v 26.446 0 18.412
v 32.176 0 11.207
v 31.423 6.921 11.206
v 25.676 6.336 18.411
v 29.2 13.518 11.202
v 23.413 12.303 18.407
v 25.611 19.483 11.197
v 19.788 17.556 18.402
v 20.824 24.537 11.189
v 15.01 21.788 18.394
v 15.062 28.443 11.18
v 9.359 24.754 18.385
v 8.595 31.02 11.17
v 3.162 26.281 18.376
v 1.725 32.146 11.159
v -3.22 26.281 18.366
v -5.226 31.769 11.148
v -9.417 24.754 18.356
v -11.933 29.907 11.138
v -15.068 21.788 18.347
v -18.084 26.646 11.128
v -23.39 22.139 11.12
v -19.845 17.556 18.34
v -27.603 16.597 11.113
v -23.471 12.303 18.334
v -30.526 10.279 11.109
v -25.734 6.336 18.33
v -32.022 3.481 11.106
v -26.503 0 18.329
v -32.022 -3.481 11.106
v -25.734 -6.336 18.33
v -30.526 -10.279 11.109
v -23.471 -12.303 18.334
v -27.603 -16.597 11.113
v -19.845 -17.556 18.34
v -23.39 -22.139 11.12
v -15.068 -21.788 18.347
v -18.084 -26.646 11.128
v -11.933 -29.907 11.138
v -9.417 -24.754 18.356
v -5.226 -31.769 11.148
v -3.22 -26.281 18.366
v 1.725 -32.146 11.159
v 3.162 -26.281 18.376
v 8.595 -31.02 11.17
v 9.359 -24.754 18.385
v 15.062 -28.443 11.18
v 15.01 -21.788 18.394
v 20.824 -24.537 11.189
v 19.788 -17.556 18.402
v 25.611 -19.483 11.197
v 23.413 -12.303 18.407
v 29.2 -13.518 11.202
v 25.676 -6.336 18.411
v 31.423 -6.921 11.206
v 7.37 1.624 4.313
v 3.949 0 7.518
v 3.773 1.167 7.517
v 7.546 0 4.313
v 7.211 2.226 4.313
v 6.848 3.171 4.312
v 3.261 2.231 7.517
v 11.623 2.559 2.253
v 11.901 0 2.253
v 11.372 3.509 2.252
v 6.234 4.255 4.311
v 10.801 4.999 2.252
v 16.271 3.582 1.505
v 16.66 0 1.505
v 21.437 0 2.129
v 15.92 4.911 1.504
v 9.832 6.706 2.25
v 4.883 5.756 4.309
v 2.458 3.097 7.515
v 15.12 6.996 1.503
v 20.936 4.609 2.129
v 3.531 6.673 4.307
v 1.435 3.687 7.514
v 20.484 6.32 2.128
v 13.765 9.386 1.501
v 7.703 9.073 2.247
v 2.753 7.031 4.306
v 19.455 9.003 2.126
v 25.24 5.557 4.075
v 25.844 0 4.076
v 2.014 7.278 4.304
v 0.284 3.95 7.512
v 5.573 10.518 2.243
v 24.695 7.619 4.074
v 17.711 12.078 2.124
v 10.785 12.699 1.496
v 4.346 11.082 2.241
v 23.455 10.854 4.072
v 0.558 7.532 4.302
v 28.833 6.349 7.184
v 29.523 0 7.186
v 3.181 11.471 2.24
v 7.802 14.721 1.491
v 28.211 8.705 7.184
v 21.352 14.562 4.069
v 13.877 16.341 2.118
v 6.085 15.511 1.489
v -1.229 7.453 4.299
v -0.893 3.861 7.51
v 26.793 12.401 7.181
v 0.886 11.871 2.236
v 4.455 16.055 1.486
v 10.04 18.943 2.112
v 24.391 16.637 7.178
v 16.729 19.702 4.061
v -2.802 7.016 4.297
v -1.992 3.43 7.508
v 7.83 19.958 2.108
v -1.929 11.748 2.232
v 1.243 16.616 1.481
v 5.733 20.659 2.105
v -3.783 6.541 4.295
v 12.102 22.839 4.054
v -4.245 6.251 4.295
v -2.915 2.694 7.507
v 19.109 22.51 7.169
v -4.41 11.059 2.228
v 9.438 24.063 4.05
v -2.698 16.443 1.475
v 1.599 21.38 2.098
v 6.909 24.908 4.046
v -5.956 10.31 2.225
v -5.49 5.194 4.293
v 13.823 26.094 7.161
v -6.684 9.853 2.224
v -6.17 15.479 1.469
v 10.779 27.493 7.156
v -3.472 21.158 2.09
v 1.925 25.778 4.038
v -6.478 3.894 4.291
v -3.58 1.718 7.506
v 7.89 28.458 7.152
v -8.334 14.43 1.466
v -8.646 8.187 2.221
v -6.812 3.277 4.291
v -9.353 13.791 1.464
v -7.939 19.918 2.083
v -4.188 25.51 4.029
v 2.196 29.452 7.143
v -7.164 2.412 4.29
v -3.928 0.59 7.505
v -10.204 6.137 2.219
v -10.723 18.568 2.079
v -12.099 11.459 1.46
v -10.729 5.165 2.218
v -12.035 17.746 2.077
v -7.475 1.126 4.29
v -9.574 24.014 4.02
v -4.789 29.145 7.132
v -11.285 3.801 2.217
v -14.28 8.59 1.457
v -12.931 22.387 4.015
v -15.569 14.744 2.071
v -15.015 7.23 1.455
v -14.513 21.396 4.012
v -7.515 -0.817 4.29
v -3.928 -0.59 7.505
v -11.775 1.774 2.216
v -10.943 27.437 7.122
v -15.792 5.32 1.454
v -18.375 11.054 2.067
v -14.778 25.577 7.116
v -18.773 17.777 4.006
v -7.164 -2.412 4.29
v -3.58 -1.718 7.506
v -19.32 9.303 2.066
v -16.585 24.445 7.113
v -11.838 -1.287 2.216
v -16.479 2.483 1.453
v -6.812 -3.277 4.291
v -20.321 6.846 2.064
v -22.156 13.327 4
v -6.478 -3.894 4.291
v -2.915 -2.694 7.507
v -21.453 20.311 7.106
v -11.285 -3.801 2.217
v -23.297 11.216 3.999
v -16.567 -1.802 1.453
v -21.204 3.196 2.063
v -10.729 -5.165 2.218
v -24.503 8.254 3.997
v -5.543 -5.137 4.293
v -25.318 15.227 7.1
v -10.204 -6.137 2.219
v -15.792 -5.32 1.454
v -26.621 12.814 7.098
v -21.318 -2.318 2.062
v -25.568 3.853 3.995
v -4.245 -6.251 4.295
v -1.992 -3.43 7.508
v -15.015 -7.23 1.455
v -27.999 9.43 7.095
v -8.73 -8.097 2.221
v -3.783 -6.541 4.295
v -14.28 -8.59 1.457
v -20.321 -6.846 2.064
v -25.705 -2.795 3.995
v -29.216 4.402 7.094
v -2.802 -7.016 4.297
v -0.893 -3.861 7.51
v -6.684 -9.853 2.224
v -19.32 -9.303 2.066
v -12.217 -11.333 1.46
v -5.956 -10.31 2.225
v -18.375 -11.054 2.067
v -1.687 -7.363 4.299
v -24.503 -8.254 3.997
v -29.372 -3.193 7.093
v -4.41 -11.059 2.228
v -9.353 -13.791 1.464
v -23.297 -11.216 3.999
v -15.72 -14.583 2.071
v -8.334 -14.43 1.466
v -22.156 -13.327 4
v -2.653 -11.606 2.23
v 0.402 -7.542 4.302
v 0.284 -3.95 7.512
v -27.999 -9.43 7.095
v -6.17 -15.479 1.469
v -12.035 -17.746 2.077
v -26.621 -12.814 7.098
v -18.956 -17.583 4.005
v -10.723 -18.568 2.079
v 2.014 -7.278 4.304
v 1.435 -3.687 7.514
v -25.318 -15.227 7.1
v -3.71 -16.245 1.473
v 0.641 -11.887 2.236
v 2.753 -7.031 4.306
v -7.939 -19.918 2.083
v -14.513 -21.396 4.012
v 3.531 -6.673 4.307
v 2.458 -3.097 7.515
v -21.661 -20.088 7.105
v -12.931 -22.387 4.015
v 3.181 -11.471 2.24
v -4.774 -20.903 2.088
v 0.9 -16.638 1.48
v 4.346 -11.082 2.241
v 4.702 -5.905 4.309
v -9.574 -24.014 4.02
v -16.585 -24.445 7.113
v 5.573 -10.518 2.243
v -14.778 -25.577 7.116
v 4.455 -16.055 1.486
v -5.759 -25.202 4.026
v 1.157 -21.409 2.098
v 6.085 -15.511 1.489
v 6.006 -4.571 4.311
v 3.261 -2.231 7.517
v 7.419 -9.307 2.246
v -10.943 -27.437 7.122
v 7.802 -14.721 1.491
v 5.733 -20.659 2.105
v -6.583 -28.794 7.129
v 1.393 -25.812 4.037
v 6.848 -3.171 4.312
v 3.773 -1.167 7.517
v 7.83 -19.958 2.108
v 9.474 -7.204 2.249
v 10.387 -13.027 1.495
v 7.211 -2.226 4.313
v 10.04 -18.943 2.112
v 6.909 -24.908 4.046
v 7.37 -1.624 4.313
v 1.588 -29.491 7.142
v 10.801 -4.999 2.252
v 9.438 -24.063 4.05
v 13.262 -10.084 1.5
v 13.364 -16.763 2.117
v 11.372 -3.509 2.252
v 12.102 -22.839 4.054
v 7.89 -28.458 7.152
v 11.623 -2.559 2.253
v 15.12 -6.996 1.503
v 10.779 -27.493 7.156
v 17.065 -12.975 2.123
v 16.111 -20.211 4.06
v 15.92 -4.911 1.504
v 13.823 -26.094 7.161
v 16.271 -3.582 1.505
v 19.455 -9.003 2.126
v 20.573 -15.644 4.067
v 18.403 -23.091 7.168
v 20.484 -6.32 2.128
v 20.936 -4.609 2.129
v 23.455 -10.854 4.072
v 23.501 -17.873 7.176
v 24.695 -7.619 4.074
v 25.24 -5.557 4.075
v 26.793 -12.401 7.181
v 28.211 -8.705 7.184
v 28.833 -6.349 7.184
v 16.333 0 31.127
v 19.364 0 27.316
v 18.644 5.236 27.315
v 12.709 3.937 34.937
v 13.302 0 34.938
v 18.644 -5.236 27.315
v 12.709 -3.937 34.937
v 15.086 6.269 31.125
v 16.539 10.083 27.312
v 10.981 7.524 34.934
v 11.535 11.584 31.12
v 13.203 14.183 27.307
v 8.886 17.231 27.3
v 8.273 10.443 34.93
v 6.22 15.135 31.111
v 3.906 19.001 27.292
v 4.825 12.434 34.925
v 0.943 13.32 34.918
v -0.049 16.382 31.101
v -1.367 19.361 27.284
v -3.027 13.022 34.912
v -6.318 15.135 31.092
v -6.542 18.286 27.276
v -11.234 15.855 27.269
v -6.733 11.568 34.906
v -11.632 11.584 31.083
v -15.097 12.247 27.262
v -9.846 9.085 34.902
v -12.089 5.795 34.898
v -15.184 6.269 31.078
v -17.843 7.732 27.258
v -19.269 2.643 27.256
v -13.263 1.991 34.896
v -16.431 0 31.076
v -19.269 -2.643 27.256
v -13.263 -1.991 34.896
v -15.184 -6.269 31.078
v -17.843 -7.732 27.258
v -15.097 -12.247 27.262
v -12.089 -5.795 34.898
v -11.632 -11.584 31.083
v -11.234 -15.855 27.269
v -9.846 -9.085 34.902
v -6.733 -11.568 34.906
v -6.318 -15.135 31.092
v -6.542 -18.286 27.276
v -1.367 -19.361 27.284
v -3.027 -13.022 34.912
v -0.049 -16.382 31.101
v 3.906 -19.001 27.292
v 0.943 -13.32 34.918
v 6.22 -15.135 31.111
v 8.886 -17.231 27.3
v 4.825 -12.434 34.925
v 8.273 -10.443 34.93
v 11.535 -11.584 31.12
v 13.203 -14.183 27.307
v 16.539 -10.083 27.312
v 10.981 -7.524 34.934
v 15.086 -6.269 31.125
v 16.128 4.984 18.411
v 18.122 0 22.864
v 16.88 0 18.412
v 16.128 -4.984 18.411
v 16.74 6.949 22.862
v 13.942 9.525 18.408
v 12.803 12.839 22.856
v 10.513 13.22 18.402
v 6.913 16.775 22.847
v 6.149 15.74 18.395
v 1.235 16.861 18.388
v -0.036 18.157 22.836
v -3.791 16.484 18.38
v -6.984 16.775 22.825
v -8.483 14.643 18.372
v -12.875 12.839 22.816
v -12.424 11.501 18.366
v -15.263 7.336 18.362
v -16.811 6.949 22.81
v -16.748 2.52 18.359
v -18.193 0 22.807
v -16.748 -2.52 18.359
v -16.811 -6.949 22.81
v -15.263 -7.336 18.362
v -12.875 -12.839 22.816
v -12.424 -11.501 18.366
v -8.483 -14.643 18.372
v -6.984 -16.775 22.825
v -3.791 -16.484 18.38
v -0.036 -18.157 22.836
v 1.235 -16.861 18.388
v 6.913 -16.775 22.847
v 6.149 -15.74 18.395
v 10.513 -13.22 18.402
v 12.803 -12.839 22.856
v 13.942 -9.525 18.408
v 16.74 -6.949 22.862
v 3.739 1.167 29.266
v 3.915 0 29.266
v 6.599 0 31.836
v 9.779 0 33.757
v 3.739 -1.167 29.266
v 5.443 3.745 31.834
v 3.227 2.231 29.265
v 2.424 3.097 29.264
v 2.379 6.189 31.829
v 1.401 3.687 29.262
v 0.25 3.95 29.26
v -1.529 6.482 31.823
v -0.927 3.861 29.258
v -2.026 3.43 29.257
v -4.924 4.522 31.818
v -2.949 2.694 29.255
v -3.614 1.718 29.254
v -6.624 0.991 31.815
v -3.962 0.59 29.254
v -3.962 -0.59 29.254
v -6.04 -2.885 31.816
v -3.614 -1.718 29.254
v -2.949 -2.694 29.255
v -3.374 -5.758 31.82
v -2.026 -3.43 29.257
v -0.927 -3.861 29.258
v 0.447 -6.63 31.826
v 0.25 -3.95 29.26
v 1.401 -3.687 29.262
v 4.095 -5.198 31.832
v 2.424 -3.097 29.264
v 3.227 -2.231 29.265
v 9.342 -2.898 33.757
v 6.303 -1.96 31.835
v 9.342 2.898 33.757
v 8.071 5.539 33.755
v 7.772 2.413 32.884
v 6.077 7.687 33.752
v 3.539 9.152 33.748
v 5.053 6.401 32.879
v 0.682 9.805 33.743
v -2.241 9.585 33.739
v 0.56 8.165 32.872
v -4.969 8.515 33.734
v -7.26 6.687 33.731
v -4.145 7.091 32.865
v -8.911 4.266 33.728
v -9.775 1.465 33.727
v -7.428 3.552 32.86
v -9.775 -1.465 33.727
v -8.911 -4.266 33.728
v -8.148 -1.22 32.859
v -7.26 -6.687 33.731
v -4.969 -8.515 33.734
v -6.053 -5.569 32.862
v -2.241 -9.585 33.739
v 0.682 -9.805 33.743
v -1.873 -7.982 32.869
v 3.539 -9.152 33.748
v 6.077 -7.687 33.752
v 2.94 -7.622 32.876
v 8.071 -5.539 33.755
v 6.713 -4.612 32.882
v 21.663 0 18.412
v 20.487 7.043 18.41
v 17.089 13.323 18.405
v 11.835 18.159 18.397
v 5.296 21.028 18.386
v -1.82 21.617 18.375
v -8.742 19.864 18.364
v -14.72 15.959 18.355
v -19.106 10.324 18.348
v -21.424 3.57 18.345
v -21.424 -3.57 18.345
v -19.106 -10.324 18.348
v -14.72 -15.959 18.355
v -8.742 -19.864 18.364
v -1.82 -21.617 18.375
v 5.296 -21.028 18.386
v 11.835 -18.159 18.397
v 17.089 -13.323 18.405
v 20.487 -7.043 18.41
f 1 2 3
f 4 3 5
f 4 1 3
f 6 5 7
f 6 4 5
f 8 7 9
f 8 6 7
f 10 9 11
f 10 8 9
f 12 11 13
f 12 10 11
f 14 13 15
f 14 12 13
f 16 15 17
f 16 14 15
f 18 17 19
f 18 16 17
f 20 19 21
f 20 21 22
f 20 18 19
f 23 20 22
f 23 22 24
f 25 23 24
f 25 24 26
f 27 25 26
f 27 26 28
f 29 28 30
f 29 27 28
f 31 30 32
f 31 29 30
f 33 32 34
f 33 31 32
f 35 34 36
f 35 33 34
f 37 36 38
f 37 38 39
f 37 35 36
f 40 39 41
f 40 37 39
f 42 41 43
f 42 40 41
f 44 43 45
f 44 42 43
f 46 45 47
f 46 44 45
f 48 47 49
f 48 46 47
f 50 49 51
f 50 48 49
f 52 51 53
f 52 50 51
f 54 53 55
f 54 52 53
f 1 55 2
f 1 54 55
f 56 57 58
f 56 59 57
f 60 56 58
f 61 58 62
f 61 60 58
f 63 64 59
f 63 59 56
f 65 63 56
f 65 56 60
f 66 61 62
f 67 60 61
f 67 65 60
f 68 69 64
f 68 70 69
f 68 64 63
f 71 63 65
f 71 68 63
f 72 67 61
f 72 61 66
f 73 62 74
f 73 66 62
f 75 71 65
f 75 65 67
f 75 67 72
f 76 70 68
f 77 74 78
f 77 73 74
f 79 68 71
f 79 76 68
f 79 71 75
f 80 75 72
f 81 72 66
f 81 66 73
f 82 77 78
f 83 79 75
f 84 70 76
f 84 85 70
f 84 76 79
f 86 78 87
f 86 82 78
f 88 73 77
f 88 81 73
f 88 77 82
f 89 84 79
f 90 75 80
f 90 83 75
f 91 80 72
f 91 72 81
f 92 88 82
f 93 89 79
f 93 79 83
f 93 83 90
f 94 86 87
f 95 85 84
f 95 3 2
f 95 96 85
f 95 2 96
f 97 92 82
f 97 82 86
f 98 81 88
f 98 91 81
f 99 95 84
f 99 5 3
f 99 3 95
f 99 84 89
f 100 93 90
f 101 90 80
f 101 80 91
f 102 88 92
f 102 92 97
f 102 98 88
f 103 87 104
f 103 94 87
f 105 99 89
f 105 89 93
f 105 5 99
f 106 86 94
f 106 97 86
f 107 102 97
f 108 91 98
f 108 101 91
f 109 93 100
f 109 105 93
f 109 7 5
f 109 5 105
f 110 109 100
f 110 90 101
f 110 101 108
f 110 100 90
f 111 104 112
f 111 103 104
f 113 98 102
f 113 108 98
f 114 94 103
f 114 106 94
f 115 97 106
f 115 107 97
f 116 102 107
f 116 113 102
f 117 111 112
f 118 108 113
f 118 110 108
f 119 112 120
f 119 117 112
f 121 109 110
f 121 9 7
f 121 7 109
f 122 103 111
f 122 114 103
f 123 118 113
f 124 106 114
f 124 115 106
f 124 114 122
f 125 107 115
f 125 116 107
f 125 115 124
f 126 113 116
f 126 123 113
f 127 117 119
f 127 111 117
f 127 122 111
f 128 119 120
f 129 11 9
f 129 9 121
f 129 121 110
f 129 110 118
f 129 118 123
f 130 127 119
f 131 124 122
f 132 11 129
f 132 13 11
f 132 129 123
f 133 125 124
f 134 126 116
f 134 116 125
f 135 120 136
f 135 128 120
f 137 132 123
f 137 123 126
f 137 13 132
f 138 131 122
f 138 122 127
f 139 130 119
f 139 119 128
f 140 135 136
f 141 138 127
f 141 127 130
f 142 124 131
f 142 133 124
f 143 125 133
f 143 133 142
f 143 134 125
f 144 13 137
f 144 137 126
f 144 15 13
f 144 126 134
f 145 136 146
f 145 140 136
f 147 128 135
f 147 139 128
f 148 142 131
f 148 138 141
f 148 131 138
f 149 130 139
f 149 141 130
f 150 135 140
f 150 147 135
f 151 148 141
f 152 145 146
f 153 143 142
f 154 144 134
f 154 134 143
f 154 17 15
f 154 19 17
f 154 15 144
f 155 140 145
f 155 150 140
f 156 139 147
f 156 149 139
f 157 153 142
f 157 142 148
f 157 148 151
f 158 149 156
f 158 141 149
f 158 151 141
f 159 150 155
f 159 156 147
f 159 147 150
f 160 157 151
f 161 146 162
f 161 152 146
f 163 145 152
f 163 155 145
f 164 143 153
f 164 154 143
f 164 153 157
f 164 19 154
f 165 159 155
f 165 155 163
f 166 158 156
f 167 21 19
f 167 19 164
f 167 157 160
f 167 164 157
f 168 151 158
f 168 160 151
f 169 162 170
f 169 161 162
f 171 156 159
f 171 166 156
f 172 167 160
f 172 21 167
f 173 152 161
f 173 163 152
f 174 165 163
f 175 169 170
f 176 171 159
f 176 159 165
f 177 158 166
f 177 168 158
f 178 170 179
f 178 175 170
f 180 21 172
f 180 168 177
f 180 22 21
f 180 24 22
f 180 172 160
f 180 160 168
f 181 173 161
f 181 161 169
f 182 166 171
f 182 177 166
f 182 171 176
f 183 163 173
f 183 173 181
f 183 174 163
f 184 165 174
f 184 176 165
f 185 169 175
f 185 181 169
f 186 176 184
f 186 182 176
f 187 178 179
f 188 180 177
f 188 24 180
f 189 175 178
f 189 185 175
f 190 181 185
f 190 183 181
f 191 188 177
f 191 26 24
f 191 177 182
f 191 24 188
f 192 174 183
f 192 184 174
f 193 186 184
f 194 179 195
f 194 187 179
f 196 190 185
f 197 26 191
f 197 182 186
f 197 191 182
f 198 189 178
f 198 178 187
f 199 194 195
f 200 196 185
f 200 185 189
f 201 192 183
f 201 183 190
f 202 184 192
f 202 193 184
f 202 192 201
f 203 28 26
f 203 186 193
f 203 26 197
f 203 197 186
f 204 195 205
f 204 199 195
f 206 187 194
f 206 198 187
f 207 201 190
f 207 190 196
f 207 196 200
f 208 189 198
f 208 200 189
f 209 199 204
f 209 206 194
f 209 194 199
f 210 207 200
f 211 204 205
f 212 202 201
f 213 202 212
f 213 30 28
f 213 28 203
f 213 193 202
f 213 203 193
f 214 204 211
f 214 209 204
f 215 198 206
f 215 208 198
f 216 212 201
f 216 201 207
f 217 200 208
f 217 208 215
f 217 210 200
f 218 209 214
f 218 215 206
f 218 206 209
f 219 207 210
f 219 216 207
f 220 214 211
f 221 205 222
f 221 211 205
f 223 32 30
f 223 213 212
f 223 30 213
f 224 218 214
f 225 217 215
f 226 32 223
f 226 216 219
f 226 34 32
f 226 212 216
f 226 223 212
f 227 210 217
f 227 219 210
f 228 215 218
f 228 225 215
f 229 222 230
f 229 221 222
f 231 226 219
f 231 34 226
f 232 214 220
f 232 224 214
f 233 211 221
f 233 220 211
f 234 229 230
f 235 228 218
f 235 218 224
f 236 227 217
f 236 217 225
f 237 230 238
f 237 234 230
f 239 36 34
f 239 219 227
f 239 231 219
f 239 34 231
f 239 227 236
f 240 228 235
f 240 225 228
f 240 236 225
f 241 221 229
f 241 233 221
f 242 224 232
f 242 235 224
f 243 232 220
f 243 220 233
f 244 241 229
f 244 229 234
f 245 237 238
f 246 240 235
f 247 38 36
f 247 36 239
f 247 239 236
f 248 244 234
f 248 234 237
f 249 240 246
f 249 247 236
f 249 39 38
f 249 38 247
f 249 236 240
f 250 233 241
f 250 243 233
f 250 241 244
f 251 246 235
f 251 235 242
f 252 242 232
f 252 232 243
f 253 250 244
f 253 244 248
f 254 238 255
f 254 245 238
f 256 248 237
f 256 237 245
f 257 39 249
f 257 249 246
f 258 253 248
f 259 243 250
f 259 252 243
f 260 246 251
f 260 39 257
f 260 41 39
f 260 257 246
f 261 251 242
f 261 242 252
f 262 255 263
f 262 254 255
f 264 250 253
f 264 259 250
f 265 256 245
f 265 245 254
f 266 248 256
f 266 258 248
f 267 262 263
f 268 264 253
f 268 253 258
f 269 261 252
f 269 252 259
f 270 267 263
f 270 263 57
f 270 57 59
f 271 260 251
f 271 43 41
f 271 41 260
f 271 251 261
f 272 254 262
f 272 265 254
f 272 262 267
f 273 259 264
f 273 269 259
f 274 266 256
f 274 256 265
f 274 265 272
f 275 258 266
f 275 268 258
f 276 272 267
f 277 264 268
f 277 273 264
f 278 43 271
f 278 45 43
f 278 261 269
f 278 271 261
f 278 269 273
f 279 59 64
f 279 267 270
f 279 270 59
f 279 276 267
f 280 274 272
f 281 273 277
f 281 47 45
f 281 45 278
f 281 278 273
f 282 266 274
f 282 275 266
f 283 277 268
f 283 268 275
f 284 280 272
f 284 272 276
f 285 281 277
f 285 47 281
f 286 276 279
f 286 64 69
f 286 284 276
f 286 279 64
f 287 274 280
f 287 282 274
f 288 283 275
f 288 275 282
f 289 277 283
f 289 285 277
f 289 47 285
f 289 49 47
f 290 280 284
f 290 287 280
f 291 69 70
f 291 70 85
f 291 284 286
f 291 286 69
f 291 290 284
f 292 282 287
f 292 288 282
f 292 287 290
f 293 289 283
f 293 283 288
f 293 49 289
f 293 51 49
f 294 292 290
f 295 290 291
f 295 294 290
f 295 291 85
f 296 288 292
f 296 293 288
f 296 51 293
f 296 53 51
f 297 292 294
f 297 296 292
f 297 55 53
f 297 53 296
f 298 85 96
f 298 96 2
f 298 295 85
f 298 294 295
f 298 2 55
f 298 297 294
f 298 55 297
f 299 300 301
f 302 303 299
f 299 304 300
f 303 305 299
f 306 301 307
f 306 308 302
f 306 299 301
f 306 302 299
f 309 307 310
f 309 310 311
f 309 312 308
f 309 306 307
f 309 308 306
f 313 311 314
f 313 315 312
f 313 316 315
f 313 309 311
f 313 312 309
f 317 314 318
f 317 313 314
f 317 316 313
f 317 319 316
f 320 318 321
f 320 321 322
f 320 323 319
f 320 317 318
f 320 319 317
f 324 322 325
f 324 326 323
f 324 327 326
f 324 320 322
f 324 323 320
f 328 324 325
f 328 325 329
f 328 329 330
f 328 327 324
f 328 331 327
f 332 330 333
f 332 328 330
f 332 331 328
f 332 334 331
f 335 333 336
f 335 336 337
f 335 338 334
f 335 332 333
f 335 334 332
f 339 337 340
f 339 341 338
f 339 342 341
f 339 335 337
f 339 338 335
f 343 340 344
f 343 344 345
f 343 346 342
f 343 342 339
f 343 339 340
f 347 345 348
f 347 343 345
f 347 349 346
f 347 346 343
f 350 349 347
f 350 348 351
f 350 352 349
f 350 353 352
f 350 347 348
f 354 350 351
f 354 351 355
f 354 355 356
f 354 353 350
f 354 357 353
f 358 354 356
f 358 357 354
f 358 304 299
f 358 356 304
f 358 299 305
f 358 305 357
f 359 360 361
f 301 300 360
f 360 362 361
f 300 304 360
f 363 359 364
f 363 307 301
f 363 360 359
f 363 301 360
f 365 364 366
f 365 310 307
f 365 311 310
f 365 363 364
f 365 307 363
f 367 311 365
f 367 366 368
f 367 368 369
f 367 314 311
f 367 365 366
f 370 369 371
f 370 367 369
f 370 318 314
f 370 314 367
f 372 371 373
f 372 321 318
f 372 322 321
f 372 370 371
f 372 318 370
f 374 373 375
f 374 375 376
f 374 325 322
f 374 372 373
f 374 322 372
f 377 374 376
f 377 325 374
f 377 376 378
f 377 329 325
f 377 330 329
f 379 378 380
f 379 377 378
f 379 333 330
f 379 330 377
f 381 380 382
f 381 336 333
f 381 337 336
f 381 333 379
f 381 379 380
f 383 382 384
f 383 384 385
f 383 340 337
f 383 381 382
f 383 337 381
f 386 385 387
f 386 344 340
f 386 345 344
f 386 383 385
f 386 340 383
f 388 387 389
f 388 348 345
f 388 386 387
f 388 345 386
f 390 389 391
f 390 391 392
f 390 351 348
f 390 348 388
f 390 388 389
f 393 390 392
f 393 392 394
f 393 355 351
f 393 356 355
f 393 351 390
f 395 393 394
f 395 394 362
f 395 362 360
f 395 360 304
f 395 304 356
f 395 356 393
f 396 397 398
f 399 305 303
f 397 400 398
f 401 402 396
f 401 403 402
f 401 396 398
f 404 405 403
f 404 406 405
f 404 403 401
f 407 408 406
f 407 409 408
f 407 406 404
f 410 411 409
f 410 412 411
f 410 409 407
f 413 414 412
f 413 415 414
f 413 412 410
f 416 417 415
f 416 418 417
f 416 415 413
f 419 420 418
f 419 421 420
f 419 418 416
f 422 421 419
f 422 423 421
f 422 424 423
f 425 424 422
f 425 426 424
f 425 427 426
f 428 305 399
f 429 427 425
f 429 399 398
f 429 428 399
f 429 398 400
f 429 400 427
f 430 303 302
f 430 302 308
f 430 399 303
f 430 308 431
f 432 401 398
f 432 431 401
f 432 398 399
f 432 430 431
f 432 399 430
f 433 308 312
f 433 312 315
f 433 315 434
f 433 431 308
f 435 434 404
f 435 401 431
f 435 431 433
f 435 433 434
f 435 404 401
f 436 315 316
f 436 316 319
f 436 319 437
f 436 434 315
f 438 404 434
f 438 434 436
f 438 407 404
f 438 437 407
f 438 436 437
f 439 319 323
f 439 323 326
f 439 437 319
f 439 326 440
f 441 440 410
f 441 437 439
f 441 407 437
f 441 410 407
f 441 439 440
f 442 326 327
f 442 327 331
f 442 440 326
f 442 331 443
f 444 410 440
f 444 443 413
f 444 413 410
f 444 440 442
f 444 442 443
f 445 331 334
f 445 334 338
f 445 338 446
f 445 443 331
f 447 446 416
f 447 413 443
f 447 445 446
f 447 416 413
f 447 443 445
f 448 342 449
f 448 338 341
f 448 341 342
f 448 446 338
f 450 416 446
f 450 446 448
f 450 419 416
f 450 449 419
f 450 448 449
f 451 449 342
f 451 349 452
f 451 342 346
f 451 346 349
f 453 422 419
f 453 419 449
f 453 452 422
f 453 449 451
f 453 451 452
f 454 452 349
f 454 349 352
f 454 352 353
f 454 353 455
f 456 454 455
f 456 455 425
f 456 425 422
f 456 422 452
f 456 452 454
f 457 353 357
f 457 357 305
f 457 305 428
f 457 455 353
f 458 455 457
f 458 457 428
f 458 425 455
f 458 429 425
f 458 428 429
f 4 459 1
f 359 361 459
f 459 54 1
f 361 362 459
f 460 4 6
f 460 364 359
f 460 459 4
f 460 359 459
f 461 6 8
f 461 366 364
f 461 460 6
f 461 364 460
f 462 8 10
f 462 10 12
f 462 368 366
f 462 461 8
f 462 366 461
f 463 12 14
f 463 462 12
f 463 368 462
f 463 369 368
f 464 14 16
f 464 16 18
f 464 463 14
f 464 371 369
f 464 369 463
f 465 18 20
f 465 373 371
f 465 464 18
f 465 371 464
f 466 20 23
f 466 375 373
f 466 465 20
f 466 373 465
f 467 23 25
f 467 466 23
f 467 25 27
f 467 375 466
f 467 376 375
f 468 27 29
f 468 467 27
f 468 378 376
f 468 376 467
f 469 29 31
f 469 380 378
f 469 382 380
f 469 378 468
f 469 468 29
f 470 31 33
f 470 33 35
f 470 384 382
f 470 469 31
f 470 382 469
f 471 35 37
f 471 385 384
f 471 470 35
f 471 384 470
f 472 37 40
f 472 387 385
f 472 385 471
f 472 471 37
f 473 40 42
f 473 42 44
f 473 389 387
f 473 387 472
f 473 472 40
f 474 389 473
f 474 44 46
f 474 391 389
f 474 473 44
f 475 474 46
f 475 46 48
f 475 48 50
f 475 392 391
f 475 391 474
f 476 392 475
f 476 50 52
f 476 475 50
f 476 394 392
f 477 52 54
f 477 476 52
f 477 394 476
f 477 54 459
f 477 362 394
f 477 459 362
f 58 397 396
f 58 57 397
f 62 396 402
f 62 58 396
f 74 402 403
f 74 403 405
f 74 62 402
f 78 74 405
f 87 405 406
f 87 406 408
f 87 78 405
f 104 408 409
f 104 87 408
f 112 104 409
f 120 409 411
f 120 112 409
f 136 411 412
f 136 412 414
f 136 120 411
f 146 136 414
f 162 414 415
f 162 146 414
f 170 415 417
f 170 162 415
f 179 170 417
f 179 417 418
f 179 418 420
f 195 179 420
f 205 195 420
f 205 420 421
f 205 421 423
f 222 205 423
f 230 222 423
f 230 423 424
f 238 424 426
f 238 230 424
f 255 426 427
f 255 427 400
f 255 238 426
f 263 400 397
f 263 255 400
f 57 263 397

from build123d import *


with BuildPart() as f1:
    # F0 (on Front) → F1 (revolve)
    with BuildSketch(Plane.XZ):
        with BuildLine():
            Line((19.363788, 27.316456), (13.302453, 34.937789))
            ThreePointArc((13.302453, 34.937789), (8.135951, 32.884255), (3.914775, 29.266049))
            Line((3.914775, 29.266049), (3.948856, 7.517579))
            ThreePointArc((3.948856, 7.517579), (19.070867, 1.646298), (32.175929, 11.206869))
            Line((32.175929, 11.206869), (26.445522, 18.412104))
            Line((26.445522, 18.412104), (16.87957, 18.412104))
            Line((16.87957, 18.412104), (19.363788, 27.316456))
        make_face()
    revolve(axis=Axis((-0.029552, 0, 18.85881), (-0.001567, 0, 0.999999)))


solid = f1.part
